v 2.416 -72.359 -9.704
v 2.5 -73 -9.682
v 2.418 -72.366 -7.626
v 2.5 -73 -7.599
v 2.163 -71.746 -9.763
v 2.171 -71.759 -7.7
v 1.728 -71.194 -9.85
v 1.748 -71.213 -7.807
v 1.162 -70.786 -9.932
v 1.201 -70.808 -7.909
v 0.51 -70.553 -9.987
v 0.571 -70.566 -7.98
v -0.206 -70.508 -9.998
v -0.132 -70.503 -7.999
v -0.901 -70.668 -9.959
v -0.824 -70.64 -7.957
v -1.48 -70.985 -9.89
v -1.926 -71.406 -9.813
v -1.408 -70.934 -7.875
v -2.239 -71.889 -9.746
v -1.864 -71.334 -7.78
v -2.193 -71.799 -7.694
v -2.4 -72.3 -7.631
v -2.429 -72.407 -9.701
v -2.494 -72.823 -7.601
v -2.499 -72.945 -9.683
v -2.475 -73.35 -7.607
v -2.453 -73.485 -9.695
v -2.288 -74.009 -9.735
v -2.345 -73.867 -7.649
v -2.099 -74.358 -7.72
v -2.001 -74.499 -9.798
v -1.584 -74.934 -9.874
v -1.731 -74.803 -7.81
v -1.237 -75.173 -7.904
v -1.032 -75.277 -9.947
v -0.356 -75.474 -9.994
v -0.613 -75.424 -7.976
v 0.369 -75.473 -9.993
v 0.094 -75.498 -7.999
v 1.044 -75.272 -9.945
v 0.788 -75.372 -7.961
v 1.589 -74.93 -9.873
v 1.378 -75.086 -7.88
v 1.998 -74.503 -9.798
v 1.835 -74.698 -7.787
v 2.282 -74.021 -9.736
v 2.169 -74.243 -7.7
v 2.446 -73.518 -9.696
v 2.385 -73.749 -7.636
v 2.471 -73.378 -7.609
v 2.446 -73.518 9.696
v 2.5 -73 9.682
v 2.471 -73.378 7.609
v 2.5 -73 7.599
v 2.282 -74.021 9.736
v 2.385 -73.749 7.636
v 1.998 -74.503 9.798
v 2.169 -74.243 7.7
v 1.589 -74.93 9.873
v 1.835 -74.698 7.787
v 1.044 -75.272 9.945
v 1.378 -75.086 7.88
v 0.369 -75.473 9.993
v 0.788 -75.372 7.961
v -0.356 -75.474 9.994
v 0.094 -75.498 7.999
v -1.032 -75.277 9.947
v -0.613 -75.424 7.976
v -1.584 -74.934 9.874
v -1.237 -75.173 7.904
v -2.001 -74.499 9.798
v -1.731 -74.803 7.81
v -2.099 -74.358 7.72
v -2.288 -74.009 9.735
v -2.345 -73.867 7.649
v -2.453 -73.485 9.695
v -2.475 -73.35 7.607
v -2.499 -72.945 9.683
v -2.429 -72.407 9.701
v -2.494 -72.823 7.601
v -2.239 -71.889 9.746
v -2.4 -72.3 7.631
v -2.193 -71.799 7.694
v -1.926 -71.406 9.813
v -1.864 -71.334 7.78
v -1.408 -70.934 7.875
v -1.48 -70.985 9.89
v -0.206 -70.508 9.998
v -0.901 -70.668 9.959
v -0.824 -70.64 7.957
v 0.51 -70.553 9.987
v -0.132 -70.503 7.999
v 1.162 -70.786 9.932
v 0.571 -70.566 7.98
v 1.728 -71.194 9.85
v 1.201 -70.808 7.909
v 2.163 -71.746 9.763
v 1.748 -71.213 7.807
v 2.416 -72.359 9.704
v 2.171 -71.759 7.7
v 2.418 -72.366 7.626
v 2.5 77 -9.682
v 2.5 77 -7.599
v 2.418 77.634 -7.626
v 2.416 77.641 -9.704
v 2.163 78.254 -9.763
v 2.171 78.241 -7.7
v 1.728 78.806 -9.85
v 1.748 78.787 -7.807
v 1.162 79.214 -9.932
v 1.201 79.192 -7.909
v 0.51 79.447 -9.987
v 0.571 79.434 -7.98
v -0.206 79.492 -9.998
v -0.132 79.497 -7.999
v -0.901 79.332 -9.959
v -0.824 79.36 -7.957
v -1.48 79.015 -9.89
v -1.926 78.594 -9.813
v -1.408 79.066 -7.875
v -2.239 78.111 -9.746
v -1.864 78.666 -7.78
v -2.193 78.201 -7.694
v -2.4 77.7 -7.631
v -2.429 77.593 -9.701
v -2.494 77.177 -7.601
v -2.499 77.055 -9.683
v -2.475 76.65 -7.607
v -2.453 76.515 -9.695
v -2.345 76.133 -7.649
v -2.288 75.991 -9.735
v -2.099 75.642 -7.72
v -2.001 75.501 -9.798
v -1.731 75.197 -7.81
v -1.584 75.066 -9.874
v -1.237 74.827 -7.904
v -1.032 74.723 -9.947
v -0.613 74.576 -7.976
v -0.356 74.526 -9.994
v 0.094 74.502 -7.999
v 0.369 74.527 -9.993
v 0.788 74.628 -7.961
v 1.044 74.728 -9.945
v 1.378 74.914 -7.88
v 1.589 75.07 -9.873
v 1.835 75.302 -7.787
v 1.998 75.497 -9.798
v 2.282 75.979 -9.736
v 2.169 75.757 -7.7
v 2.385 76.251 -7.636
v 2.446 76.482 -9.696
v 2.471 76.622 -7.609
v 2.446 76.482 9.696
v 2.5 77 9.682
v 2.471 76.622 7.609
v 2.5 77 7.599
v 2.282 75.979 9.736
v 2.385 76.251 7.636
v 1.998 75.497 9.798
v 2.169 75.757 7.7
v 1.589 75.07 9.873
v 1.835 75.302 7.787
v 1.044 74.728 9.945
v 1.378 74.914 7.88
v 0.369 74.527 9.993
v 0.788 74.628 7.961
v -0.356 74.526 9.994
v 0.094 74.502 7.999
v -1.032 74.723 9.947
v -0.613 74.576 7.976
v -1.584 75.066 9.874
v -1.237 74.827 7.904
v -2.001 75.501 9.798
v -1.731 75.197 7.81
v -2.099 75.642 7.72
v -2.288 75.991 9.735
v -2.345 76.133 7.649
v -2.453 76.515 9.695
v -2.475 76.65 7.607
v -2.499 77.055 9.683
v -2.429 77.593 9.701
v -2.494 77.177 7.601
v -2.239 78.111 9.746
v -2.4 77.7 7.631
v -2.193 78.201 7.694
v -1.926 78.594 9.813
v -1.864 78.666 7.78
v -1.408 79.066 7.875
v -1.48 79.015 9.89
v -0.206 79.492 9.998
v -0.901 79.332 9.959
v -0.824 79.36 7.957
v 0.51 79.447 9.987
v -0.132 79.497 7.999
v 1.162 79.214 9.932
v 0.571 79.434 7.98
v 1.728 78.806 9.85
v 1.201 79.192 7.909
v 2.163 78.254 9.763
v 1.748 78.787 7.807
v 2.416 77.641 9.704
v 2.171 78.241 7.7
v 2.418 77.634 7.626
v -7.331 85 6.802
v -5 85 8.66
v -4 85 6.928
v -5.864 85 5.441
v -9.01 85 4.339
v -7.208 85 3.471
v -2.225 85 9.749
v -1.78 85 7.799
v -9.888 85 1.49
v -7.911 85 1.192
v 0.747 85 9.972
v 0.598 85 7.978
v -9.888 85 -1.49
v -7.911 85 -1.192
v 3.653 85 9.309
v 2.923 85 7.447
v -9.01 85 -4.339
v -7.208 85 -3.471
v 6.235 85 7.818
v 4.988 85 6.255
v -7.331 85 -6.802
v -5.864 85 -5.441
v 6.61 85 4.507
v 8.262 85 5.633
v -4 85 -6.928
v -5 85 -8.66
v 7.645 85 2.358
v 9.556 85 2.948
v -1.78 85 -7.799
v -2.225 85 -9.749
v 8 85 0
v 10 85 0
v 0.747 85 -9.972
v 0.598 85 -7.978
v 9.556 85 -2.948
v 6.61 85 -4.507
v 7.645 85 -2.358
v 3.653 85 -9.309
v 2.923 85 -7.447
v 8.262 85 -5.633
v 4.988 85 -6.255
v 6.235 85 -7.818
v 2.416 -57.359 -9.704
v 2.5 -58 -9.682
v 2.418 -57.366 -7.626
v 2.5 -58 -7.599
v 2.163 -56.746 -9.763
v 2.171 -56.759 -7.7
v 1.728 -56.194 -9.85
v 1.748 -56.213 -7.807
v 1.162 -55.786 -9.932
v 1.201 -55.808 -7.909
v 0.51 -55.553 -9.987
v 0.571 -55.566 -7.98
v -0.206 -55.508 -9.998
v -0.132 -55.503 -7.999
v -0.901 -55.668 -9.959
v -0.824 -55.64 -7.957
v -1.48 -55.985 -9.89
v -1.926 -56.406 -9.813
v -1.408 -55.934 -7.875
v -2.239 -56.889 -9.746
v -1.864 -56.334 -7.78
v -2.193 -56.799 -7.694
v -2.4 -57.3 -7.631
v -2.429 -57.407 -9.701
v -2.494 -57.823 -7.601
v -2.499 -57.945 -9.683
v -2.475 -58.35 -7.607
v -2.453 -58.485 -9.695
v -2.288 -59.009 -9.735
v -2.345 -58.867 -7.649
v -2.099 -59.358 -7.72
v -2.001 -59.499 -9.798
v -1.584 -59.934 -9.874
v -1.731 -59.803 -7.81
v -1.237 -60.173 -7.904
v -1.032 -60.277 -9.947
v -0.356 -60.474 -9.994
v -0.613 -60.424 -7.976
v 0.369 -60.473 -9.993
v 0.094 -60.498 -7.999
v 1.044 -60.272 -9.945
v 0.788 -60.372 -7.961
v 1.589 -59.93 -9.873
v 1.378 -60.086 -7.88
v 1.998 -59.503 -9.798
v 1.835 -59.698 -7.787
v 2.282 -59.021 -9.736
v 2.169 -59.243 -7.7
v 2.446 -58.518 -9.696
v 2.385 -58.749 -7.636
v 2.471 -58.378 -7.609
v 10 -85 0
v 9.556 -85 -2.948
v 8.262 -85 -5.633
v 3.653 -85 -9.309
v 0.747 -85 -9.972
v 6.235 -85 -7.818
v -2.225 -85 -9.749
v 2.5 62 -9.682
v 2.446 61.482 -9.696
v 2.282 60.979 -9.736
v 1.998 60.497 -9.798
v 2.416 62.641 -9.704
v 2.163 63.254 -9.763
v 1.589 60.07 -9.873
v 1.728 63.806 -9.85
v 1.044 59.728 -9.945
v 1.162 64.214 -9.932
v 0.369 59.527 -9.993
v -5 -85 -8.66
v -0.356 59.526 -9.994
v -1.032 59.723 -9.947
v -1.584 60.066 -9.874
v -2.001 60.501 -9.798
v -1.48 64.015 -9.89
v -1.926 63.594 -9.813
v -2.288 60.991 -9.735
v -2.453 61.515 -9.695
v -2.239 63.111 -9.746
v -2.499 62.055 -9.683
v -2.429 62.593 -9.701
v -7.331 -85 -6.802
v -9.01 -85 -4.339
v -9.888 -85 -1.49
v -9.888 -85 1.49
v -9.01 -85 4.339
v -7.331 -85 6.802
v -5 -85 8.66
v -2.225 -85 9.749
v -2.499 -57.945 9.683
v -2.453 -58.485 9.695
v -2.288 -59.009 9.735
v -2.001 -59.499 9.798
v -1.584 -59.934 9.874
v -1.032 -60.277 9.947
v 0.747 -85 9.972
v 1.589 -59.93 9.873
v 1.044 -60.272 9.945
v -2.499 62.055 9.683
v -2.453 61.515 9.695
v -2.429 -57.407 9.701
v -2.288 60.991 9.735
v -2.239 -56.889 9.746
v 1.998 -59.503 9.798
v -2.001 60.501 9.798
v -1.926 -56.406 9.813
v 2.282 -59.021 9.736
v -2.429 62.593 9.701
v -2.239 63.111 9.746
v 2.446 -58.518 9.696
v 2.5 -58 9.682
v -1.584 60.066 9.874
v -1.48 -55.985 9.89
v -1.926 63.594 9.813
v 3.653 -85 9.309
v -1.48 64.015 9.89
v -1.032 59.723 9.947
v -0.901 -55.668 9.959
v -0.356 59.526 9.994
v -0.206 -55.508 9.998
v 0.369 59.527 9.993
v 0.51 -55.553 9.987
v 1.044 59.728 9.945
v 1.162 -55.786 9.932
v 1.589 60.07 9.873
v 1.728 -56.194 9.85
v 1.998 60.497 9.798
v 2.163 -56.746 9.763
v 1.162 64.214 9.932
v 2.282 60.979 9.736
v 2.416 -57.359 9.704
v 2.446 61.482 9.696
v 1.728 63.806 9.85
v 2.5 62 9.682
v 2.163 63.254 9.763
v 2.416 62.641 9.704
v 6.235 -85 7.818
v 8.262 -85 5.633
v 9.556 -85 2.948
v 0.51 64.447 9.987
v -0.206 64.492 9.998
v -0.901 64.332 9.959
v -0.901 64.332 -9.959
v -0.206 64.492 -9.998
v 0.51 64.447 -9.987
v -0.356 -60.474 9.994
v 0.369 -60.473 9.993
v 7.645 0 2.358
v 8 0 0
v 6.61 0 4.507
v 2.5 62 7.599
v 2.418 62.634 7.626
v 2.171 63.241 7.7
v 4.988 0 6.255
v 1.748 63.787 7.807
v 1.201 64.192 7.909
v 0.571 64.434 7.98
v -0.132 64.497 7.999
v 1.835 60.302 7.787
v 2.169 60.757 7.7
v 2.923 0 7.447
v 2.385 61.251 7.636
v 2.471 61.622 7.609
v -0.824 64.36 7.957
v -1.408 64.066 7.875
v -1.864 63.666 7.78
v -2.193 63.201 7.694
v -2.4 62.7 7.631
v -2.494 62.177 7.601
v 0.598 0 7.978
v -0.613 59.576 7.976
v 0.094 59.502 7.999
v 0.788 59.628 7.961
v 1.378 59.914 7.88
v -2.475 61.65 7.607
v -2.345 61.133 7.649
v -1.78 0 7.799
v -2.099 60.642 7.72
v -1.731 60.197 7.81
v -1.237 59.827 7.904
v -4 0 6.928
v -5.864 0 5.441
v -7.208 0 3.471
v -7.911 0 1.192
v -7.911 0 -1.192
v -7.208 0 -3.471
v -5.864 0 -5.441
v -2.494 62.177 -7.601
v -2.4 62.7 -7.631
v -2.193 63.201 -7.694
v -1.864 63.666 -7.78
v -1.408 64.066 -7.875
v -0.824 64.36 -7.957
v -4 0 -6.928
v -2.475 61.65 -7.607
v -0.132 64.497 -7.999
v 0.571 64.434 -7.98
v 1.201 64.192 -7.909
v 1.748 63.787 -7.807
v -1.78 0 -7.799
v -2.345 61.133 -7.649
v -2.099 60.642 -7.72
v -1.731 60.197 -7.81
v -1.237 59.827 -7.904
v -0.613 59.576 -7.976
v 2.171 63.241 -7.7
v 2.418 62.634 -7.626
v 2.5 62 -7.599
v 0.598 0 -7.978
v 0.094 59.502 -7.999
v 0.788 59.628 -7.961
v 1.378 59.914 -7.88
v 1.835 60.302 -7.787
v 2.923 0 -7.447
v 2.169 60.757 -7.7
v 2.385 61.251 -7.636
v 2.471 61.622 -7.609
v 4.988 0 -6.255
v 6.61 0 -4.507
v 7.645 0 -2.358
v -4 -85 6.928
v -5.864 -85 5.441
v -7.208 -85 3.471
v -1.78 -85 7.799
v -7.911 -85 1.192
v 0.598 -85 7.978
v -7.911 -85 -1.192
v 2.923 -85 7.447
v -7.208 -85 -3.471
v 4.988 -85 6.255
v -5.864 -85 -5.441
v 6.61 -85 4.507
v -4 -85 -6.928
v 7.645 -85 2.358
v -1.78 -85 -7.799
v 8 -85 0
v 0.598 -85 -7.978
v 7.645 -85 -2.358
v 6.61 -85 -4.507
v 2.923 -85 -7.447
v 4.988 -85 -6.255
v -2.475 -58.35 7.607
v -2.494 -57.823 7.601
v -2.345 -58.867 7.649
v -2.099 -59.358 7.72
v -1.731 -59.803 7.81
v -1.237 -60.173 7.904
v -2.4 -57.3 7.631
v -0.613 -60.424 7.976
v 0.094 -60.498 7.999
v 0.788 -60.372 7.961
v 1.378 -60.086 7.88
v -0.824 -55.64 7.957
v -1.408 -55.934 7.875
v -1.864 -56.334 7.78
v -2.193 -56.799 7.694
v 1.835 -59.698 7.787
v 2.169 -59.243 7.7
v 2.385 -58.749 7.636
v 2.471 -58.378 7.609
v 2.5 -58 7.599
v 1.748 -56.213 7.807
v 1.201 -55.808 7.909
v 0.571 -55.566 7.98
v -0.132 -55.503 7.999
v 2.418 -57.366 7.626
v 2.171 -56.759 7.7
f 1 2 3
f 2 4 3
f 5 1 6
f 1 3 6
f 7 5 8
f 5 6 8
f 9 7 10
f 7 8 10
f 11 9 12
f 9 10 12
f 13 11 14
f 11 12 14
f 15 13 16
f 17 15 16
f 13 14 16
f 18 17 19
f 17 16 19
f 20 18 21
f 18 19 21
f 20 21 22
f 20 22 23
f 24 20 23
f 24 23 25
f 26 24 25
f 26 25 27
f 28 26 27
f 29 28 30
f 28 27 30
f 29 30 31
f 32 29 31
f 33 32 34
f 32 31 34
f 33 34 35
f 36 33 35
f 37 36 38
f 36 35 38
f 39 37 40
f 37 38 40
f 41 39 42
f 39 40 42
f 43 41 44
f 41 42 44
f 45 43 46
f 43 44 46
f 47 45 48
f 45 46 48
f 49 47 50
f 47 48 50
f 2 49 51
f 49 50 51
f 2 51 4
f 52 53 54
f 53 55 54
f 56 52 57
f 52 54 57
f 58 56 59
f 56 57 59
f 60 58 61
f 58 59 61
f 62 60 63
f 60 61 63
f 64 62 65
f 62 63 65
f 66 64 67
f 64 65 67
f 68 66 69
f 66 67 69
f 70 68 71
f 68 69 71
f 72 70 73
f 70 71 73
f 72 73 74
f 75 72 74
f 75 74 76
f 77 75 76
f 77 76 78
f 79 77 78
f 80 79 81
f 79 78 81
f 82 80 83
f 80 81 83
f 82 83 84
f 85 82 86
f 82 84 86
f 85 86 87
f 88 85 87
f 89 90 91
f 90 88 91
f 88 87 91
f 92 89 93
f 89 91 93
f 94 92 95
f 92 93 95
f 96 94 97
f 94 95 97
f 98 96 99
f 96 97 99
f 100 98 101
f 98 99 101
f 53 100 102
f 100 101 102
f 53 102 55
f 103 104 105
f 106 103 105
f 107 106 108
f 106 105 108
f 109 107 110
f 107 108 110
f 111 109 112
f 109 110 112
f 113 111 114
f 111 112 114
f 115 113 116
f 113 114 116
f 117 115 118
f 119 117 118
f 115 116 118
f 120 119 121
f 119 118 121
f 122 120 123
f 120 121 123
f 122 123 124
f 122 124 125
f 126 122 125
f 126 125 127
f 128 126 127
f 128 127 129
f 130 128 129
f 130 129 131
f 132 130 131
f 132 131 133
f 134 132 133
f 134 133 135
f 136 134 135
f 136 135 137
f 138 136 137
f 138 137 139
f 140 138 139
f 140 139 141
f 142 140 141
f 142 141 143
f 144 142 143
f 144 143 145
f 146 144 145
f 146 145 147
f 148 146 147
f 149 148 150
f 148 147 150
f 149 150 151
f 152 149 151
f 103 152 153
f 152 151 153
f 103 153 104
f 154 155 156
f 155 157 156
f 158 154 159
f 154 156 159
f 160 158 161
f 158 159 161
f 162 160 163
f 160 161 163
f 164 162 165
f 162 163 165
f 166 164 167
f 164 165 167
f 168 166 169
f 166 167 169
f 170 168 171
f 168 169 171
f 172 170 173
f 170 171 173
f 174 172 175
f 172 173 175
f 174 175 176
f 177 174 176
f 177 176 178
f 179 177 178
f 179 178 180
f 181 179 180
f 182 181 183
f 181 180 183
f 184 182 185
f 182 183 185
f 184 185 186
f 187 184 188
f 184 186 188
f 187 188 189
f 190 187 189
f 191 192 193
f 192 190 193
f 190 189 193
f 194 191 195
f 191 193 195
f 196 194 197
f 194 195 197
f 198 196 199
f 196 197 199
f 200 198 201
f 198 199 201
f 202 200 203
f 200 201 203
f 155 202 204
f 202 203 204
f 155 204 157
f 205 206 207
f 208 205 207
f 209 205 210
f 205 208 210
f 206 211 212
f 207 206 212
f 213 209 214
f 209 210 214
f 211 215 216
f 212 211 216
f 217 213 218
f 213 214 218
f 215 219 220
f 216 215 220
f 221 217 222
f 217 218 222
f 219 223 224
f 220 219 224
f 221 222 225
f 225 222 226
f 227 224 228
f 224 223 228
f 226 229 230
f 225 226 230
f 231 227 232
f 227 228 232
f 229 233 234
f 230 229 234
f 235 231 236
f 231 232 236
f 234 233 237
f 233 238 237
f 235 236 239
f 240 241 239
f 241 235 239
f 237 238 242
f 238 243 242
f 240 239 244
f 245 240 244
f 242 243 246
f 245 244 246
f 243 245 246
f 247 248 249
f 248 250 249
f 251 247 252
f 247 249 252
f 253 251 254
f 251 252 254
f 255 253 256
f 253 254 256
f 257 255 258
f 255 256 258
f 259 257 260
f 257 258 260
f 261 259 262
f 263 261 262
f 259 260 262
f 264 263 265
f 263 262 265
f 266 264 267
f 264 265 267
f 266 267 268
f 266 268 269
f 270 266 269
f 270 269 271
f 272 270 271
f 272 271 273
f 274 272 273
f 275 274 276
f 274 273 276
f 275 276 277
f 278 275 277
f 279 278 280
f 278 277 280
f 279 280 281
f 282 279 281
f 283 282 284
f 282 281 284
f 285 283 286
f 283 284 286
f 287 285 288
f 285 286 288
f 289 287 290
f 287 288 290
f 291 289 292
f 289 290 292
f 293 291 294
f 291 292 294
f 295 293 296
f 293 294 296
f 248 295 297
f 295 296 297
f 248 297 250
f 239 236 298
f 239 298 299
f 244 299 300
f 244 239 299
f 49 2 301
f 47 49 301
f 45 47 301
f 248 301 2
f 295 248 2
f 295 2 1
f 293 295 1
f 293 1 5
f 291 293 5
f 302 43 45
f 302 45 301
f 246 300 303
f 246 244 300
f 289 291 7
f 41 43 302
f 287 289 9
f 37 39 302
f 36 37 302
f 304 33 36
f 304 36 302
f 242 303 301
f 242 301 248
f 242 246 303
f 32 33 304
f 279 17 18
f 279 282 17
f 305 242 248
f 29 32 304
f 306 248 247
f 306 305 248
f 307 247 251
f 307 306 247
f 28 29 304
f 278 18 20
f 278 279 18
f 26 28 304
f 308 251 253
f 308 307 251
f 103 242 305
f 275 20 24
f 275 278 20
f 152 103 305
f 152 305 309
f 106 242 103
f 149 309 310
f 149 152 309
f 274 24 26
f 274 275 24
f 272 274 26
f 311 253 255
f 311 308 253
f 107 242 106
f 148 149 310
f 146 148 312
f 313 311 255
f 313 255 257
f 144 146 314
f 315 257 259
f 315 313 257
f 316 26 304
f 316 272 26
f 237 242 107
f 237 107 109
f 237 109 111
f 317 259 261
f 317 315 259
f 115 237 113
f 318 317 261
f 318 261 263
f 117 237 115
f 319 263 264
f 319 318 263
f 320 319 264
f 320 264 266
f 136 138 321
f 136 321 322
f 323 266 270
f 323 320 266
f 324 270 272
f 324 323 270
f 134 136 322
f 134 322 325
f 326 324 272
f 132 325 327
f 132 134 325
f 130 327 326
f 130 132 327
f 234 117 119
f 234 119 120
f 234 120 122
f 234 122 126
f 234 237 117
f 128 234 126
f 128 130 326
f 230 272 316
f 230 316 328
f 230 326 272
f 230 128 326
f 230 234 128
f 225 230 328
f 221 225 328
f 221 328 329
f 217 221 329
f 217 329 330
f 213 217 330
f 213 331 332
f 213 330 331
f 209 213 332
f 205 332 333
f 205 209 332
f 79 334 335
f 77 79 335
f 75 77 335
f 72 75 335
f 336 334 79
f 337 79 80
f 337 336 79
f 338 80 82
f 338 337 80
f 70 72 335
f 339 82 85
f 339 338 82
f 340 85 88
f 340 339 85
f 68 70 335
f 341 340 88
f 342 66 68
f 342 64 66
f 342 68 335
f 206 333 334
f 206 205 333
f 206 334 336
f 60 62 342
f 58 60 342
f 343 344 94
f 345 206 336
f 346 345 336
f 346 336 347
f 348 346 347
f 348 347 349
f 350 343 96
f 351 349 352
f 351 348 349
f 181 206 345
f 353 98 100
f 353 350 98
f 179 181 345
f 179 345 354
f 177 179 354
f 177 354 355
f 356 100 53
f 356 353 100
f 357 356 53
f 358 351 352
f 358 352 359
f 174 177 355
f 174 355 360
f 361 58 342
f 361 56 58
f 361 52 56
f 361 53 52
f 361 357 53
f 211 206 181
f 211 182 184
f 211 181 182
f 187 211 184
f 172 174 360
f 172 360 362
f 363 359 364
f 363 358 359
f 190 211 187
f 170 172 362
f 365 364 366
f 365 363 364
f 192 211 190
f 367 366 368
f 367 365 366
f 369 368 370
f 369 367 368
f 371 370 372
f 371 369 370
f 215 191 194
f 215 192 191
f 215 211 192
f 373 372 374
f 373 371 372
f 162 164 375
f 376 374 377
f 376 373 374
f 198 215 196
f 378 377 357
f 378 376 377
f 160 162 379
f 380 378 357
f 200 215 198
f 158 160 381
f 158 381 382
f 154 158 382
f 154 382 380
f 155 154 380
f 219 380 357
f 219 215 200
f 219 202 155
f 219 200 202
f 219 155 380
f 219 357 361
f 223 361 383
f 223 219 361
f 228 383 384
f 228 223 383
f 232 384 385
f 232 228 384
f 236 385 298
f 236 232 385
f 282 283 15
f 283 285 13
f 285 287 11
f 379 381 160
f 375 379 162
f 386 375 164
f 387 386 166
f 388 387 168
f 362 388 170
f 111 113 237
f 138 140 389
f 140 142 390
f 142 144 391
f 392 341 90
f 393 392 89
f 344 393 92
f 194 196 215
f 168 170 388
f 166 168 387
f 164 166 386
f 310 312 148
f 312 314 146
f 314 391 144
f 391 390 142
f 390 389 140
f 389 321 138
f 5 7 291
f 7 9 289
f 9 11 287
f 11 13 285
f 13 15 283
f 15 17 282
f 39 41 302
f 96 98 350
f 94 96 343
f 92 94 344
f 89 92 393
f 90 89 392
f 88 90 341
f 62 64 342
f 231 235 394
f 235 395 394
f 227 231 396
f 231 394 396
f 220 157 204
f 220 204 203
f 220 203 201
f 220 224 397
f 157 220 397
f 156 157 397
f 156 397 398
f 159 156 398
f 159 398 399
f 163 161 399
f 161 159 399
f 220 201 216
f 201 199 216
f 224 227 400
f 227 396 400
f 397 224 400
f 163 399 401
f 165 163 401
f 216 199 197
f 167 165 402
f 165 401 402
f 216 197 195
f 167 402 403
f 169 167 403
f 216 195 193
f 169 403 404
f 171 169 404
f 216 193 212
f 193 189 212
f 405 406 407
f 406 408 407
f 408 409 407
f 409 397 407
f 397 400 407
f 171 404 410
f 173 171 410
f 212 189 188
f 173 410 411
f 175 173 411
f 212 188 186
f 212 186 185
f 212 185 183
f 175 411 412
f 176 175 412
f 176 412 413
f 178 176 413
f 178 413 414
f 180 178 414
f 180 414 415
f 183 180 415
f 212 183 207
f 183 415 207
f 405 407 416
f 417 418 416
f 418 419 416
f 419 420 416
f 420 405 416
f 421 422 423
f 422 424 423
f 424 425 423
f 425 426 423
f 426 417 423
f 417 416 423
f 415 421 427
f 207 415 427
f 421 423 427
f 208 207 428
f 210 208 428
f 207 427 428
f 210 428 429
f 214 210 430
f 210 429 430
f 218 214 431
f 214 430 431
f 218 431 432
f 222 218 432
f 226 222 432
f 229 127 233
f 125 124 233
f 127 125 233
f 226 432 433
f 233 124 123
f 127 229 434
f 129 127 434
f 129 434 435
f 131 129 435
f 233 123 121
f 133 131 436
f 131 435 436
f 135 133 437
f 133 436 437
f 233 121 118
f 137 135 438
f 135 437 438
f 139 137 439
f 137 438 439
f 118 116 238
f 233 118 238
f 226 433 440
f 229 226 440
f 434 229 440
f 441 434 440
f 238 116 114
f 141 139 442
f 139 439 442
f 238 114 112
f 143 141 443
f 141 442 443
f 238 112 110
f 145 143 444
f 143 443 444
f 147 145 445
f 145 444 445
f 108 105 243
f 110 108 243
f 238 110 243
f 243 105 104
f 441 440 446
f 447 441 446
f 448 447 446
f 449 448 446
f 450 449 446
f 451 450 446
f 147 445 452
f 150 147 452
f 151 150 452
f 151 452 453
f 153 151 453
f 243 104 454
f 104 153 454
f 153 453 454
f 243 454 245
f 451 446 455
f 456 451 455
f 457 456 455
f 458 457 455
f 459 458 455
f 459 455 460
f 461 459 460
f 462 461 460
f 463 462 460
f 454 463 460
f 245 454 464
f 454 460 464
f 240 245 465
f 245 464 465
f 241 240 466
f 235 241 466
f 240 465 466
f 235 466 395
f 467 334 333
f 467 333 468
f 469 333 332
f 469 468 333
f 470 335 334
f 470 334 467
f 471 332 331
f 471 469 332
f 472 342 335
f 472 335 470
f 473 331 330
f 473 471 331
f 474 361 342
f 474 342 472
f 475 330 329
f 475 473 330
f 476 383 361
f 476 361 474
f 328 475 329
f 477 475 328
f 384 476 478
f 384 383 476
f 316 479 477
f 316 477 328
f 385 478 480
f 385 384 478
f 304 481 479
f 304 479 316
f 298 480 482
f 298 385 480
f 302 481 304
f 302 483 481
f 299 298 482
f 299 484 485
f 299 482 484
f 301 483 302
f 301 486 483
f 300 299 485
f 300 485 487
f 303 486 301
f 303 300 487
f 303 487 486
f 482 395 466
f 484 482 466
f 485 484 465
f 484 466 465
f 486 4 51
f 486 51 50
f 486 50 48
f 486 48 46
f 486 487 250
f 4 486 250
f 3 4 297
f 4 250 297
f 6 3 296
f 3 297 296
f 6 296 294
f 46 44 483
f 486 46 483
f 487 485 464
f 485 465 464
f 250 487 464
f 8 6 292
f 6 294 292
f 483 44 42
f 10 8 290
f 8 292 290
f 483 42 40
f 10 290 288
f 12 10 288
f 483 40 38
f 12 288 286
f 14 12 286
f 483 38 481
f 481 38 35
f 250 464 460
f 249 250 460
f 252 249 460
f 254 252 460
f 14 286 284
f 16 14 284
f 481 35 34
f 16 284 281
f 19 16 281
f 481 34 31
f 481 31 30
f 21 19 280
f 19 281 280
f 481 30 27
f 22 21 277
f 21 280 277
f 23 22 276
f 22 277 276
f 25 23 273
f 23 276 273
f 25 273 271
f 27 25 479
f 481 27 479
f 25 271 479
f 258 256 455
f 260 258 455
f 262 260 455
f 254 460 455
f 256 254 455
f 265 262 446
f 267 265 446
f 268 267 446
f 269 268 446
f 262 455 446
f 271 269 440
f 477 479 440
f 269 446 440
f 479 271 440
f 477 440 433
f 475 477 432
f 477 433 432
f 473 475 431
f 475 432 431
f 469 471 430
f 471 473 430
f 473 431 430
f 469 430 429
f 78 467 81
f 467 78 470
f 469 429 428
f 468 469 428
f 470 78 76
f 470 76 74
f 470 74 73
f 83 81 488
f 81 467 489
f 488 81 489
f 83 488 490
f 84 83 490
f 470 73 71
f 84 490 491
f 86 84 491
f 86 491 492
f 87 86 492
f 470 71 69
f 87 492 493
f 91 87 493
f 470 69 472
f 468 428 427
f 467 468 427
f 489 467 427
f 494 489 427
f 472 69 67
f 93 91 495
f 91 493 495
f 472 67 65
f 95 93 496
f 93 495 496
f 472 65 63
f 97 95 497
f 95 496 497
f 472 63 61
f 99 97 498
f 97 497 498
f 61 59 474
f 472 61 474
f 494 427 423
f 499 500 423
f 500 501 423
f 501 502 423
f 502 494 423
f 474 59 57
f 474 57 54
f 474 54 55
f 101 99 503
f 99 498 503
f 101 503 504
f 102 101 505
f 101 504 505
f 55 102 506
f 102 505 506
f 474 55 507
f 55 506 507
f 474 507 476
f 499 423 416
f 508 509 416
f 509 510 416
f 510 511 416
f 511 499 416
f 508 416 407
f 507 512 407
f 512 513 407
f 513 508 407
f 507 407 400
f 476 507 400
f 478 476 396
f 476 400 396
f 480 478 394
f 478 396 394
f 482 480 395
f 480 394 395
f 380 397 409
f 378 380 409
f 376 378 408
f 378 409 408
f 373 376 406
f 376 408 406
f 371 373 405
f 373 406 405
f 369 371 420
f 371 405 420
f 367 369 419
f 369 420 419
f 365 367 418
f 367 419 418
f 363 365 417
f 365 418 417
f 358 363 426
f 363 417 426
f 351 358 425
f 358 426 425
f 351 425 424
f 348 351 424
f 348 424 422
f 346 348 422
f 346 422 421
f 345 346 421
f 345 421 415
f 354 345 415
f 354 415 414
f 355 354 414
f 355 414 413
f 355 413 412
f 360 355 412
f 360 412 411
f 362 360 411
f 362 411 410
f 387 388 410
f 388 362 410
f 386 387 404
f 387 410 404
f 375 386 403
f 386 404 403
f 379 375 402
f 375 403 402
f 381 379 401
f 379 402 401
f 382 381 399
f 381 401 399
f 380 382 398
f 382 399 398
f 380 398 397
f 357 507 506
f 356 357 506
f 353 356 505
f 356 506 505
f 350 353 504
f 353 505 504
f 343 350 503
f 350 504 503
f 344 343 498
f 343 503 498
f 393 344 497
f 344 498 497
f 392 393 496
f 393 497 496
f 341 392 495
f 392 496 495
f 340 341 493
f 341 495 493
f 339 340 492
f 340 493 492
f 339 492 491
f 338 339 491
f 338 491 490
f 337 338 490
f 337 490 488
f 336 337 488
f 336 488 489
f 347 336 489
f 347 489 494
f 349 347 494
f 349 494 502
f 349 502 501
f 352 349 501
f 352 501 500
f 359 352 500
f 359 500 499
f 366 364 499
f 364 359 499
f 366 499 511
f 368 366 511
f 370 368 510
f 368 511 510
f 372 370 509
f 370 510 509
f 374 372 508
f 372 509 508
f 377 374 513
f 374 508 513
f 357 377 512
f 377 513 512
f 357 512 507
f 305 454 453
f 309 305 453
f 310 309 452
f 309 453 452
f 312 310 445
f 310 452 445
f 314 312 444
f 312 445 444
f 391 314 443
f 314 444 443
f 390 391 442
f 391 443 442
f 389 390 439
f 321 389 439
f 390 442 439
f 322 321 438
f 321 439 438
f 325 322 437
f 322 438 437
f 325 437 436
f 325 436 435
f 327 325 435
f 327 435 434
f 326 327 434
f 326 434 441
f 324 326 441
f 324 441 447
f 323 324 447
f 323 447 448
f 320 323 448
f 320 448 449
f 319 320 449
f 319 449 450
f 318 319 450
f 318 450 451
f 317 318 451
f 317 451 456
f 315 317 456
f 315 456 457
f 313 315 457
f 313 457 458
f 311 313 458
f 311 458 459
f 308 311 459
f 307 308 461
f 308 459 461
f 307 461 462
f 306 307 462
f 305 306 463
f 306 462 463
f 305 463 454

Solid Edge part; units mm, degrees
sketch "Sketch1" plane through (0, 0, 0) normal (0, -1, 0) x (1, 0, 0)
  circle A0 centre (0, 0) radius 10
  circle A1 centre (0, 0) radius 8
extrude "Protrusion1" add sketch "Sketch1" along normal mid plane 170
sketch "Sketch2" plane through (0, 0, 0) normal (0, 0, 1) x (1, 0, 0)
  circle A0 centre (0, -73) radius 2.5
  circle A1 centre (0, -58) radius 2.5
  circle A2 centre (0, 77) radius 2.5
  circle A3 centre (0, 62) radius 2.5
extrude "ExtrudedCutout_1" cut sketch "Sketch2" along normal mid plane 325.0188
properties material "PVC"
